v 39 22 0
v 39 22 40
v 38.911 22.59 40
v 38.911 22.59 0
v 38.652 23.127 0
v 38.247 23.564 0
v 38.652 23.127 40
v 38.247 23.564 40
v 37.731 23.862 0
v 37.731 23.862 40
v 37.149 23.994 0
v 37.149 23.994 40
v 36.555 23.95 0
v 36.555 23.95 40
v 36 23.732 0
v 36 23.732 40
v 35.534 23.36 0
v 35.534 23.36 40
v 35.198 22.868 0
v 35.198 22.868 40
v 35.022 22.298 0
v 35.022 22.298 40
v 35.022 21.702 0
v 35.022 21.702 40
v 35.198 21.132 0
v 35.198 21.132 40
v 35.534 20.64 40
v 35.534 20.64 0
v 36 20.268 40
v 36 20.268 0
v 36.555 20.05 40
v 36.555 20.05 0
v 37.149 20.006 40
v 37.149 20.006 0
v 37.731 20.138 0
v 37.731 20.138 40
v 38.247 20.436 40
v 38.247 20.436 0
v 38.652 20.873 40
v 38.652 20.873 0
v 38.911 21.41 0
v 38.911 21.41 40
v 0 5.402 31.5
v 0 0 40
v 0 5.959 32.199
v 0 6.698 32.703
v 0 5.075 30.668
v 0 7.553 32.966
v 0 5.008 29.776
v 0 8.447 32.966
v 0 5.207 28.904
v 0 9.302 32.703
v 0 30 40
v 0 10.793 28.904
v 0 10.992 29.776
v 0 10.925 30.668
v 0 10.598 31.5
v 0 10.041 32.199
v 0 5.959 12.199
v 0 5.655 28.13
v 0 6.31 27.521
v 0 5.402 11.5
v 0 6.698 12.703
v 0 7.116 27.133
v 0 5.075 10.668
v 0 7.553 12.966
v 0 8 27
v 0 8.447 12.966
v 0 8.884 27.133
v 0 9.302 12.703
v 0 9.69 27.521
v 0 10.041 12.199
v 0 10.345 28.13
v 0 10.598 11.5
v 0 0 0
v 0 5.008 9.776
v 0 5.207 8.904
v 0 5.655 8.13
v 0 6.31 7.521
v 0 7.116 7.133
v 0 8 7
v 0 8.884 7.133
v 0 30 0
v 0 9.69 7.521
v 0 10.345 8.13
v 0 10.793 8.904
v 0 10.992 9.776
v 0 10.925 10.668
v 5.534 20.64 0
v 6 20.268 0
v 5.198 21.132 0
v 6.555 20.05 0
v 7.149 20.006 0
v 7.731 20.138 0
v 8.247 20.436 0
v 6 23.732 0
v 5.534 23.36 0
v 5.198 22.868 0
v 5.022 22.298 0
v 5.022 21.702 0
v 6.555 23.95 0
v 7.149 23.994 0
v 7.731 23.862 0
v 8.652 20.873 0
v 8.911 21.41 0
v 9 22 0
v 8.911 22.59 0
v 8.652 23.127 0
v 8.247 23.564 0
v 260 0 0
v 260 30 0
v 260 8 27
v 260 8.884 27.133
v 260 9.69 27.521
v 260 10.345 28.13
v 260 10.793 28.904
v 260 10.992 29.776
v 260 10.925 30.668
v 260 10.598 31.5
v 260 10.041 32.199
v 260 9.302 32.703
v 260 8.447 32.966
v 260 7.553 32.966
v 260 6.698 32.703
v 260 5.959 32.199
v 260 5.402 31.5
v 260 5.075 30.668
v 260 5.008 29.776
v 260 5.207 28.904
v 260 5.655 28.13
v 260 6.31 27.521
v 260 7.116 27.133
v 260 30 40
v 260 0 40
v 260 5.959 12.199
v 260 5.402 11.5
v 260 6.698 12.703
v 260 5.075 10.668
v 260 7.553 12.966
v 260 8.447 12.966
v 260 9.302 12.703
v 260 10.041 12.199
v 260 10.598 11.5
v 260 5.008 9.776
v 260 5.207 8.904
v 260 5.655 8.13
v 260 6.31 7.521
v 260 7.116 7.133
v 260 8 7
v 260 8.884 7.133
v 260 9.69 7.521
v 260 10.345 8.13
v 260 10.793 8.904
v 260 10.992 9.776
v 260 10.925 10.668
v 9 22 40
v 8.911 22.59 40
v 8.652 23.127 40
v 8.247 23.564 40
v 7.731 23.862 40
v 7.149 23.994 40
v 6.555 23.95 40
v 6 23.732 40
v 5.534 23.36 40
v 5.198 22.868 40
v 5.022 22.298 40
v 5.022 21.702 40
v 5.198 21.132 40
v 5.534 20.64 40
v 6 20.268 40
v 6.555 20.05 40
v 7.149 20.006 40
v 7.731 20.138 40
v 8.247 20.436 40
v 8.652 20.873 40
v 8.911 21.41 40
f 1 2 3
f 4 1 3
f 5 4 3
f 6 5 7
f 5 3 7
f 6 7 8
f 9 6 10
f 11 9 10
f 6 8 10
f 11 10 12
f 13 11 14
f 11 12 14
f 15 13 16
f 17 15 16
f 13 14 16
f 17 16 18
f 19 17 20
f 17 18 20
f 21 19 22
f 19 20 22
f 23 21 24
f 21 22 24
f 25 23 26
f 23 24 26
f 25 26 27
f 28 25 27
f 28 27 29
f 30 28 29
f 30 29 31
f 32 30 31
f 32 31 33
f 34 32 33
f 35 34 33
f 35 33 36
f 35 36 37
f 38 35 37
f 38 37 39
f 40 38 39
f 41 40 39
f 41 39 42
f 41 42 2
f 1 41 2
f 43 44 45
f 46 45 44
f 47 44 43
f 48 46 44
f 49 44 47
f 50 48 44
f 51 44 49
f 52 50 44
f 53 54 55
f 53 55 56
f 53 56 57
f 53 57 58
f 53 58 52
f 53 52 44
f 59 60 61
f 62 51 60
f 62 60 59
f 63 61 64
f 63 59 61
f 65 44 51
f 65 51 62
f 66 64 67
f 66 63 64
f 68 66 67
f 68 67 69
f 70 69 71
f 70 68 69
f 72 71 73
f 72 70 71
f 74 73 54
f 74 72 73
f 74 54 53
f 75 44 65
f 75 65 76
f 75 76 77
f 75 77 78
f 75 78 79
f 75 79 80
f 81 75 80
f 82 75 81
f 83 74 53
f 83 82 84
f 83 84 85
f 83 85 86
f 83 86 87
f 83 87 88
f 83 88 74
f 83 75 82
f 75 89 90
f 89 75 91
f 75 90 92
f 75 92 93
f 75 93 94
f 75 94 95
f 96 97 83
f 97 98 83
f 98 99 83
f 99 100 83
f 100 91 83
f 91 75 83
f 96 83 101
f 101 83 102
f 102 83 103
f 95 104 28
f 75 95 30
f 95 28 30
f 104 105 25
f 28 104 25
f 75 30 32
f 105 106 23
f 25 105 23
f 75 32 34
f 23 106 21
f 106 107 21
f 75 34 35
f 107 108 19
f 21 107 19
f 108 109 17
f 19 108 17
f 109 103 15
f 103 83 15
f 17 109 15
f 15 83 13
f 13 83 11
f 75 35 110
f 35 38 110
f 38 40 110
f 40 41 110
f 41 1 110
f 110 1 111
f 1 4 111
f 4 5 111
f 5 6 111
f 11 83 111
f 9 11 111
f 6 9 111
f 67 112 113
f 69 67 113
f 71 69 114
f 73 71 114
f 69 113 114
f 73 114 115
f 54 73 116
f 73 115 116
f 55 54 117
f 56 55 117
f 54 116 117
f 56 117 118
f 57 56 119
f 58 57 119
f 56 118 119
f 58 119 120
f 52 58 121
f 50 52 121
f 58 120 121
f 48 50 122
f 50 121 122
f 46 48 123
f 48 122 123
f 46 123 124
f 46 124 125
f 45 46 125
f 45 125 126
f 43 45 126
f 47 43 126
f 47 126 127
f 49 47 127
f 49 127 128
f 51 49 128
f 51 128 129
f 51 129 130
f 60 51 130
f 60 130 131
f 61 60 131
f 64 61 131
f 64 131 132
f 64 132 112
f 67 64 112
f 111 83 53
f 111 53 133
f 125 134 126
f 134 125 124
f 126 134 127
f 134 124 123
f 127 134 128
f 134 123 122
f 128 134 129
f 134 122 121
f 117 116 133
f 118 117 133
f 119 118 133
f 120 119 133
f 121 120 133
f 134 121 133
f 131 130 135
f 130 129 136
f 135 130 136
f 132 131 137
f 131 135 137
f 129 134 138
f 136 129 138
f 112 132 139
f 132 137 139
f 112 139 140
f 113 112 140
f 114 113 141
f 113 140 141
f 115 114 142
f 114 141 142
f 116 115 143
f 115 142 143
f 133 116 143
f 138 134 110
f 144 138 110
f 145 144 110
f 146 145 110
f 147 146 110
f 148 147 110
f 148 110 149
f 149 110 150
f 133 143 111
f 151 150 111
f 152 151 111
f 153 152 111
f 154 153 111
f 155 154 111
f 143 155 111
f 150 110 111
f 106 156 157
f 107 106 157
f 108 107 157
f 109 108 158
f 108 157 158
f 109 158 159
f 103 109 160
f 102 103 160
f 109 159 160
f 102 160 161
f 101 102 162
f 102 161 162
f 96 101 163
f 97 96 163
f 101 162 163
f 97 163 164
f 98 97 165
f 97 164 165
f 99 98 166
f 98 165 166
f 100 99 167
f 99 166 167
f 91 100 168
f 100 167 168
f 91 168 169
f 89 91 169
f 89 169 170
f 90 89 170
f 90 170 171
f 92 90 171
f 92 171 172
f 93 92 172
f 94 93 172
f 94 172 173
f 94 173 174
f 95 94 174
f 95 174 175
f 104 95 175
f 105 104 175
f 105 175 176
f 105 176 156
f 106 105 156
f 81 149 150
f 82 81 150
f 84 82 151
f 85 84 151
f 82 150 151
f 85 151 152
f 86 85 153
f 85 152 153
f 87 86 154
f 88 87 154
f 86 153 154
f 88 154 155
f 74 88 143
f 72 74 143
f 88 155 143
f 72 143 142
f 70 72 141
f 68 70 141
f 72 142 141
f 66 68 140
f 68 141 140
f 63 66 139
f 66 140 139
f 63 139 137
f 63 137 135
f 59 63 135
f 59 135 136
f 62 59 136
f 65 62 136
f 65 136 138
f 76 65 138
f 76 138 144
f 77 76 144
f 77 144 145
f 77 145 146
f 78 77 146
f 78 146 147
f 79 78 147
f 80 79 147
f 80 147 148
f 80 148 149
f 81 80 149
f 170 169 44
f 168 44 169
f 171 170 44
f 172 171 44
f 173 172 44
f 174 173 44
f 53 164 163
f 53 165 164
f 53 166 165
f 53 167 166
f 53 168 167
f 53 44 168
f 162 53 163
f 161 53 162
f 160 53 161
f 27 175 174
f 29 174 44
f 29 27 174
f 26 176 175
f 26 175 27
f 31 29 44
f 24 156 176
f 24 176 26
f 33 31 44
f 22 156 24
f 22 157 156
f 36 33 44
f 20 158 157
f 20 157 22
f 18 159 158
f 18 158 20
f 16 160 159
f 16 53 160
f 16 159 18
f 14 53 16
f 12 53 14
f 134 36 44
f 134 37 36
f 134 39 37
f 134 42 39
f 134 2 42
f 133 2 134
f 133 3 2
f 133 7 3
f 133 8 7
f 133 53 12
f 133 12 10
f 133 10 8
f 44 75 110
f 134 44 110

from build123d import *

# Parameters (mm, degrees)
SKETCH1_W               = 260
SKETCH1_H               = 30
BOSS_EXTRUDE1_DEPTH     = 40
ESQUISSE1_R             = 2
ENL_V_MAT_EXTRU_1_DEPTH = 265.764045897
ESQUISSE2_R             = 3
ENL_V_MAT_EXTRU_2_DEPTH = 265.764045897


with BuildPart() as part:
    # Sketch1 → Boss-Extrude1 (new body)
    with BuildSketch(Plane.XY):
        with Locations((130, 15)):
            Rectangle(SKETCH1_W, SKETCH1_H)
    extrude(amount=BOSS_EXTRUDE1_DEPTH)

    # Esquisse1 → Enlèv. mat.-Extru.1 (cut, through all)
    with BuildSketch(Plane.XY.offset(40)):
        with Locations((7, 22)):
            Circle(ESQUISSE1_R)
        with Locations((37, 22)):
            Circle(ESQUISSE1_R)
    extrude(amount=-ENL_V_MAT_EXTRU_1_DEPTH, mode=Mode.SUBTRACT)

    # Esquisse2 → Enlèv. mat.-Extru.2 (cut, through all)
    with BuildSketch(Plane(origin=(260, 0, 0), x_dir=(0, 0, -1), z_dir=(1, 0, 0))):
        with Locations((-10, 8)):
            Circle(ESQUISSE2_R)
        with Locations((-30, 8)):
            Circle(ESQUISSE2_R)
    extrude(amount=-ENL_V_MAT_EXTRU_2_DEPTH, mode=Mode.SUBTRACT)


solid = part.part
